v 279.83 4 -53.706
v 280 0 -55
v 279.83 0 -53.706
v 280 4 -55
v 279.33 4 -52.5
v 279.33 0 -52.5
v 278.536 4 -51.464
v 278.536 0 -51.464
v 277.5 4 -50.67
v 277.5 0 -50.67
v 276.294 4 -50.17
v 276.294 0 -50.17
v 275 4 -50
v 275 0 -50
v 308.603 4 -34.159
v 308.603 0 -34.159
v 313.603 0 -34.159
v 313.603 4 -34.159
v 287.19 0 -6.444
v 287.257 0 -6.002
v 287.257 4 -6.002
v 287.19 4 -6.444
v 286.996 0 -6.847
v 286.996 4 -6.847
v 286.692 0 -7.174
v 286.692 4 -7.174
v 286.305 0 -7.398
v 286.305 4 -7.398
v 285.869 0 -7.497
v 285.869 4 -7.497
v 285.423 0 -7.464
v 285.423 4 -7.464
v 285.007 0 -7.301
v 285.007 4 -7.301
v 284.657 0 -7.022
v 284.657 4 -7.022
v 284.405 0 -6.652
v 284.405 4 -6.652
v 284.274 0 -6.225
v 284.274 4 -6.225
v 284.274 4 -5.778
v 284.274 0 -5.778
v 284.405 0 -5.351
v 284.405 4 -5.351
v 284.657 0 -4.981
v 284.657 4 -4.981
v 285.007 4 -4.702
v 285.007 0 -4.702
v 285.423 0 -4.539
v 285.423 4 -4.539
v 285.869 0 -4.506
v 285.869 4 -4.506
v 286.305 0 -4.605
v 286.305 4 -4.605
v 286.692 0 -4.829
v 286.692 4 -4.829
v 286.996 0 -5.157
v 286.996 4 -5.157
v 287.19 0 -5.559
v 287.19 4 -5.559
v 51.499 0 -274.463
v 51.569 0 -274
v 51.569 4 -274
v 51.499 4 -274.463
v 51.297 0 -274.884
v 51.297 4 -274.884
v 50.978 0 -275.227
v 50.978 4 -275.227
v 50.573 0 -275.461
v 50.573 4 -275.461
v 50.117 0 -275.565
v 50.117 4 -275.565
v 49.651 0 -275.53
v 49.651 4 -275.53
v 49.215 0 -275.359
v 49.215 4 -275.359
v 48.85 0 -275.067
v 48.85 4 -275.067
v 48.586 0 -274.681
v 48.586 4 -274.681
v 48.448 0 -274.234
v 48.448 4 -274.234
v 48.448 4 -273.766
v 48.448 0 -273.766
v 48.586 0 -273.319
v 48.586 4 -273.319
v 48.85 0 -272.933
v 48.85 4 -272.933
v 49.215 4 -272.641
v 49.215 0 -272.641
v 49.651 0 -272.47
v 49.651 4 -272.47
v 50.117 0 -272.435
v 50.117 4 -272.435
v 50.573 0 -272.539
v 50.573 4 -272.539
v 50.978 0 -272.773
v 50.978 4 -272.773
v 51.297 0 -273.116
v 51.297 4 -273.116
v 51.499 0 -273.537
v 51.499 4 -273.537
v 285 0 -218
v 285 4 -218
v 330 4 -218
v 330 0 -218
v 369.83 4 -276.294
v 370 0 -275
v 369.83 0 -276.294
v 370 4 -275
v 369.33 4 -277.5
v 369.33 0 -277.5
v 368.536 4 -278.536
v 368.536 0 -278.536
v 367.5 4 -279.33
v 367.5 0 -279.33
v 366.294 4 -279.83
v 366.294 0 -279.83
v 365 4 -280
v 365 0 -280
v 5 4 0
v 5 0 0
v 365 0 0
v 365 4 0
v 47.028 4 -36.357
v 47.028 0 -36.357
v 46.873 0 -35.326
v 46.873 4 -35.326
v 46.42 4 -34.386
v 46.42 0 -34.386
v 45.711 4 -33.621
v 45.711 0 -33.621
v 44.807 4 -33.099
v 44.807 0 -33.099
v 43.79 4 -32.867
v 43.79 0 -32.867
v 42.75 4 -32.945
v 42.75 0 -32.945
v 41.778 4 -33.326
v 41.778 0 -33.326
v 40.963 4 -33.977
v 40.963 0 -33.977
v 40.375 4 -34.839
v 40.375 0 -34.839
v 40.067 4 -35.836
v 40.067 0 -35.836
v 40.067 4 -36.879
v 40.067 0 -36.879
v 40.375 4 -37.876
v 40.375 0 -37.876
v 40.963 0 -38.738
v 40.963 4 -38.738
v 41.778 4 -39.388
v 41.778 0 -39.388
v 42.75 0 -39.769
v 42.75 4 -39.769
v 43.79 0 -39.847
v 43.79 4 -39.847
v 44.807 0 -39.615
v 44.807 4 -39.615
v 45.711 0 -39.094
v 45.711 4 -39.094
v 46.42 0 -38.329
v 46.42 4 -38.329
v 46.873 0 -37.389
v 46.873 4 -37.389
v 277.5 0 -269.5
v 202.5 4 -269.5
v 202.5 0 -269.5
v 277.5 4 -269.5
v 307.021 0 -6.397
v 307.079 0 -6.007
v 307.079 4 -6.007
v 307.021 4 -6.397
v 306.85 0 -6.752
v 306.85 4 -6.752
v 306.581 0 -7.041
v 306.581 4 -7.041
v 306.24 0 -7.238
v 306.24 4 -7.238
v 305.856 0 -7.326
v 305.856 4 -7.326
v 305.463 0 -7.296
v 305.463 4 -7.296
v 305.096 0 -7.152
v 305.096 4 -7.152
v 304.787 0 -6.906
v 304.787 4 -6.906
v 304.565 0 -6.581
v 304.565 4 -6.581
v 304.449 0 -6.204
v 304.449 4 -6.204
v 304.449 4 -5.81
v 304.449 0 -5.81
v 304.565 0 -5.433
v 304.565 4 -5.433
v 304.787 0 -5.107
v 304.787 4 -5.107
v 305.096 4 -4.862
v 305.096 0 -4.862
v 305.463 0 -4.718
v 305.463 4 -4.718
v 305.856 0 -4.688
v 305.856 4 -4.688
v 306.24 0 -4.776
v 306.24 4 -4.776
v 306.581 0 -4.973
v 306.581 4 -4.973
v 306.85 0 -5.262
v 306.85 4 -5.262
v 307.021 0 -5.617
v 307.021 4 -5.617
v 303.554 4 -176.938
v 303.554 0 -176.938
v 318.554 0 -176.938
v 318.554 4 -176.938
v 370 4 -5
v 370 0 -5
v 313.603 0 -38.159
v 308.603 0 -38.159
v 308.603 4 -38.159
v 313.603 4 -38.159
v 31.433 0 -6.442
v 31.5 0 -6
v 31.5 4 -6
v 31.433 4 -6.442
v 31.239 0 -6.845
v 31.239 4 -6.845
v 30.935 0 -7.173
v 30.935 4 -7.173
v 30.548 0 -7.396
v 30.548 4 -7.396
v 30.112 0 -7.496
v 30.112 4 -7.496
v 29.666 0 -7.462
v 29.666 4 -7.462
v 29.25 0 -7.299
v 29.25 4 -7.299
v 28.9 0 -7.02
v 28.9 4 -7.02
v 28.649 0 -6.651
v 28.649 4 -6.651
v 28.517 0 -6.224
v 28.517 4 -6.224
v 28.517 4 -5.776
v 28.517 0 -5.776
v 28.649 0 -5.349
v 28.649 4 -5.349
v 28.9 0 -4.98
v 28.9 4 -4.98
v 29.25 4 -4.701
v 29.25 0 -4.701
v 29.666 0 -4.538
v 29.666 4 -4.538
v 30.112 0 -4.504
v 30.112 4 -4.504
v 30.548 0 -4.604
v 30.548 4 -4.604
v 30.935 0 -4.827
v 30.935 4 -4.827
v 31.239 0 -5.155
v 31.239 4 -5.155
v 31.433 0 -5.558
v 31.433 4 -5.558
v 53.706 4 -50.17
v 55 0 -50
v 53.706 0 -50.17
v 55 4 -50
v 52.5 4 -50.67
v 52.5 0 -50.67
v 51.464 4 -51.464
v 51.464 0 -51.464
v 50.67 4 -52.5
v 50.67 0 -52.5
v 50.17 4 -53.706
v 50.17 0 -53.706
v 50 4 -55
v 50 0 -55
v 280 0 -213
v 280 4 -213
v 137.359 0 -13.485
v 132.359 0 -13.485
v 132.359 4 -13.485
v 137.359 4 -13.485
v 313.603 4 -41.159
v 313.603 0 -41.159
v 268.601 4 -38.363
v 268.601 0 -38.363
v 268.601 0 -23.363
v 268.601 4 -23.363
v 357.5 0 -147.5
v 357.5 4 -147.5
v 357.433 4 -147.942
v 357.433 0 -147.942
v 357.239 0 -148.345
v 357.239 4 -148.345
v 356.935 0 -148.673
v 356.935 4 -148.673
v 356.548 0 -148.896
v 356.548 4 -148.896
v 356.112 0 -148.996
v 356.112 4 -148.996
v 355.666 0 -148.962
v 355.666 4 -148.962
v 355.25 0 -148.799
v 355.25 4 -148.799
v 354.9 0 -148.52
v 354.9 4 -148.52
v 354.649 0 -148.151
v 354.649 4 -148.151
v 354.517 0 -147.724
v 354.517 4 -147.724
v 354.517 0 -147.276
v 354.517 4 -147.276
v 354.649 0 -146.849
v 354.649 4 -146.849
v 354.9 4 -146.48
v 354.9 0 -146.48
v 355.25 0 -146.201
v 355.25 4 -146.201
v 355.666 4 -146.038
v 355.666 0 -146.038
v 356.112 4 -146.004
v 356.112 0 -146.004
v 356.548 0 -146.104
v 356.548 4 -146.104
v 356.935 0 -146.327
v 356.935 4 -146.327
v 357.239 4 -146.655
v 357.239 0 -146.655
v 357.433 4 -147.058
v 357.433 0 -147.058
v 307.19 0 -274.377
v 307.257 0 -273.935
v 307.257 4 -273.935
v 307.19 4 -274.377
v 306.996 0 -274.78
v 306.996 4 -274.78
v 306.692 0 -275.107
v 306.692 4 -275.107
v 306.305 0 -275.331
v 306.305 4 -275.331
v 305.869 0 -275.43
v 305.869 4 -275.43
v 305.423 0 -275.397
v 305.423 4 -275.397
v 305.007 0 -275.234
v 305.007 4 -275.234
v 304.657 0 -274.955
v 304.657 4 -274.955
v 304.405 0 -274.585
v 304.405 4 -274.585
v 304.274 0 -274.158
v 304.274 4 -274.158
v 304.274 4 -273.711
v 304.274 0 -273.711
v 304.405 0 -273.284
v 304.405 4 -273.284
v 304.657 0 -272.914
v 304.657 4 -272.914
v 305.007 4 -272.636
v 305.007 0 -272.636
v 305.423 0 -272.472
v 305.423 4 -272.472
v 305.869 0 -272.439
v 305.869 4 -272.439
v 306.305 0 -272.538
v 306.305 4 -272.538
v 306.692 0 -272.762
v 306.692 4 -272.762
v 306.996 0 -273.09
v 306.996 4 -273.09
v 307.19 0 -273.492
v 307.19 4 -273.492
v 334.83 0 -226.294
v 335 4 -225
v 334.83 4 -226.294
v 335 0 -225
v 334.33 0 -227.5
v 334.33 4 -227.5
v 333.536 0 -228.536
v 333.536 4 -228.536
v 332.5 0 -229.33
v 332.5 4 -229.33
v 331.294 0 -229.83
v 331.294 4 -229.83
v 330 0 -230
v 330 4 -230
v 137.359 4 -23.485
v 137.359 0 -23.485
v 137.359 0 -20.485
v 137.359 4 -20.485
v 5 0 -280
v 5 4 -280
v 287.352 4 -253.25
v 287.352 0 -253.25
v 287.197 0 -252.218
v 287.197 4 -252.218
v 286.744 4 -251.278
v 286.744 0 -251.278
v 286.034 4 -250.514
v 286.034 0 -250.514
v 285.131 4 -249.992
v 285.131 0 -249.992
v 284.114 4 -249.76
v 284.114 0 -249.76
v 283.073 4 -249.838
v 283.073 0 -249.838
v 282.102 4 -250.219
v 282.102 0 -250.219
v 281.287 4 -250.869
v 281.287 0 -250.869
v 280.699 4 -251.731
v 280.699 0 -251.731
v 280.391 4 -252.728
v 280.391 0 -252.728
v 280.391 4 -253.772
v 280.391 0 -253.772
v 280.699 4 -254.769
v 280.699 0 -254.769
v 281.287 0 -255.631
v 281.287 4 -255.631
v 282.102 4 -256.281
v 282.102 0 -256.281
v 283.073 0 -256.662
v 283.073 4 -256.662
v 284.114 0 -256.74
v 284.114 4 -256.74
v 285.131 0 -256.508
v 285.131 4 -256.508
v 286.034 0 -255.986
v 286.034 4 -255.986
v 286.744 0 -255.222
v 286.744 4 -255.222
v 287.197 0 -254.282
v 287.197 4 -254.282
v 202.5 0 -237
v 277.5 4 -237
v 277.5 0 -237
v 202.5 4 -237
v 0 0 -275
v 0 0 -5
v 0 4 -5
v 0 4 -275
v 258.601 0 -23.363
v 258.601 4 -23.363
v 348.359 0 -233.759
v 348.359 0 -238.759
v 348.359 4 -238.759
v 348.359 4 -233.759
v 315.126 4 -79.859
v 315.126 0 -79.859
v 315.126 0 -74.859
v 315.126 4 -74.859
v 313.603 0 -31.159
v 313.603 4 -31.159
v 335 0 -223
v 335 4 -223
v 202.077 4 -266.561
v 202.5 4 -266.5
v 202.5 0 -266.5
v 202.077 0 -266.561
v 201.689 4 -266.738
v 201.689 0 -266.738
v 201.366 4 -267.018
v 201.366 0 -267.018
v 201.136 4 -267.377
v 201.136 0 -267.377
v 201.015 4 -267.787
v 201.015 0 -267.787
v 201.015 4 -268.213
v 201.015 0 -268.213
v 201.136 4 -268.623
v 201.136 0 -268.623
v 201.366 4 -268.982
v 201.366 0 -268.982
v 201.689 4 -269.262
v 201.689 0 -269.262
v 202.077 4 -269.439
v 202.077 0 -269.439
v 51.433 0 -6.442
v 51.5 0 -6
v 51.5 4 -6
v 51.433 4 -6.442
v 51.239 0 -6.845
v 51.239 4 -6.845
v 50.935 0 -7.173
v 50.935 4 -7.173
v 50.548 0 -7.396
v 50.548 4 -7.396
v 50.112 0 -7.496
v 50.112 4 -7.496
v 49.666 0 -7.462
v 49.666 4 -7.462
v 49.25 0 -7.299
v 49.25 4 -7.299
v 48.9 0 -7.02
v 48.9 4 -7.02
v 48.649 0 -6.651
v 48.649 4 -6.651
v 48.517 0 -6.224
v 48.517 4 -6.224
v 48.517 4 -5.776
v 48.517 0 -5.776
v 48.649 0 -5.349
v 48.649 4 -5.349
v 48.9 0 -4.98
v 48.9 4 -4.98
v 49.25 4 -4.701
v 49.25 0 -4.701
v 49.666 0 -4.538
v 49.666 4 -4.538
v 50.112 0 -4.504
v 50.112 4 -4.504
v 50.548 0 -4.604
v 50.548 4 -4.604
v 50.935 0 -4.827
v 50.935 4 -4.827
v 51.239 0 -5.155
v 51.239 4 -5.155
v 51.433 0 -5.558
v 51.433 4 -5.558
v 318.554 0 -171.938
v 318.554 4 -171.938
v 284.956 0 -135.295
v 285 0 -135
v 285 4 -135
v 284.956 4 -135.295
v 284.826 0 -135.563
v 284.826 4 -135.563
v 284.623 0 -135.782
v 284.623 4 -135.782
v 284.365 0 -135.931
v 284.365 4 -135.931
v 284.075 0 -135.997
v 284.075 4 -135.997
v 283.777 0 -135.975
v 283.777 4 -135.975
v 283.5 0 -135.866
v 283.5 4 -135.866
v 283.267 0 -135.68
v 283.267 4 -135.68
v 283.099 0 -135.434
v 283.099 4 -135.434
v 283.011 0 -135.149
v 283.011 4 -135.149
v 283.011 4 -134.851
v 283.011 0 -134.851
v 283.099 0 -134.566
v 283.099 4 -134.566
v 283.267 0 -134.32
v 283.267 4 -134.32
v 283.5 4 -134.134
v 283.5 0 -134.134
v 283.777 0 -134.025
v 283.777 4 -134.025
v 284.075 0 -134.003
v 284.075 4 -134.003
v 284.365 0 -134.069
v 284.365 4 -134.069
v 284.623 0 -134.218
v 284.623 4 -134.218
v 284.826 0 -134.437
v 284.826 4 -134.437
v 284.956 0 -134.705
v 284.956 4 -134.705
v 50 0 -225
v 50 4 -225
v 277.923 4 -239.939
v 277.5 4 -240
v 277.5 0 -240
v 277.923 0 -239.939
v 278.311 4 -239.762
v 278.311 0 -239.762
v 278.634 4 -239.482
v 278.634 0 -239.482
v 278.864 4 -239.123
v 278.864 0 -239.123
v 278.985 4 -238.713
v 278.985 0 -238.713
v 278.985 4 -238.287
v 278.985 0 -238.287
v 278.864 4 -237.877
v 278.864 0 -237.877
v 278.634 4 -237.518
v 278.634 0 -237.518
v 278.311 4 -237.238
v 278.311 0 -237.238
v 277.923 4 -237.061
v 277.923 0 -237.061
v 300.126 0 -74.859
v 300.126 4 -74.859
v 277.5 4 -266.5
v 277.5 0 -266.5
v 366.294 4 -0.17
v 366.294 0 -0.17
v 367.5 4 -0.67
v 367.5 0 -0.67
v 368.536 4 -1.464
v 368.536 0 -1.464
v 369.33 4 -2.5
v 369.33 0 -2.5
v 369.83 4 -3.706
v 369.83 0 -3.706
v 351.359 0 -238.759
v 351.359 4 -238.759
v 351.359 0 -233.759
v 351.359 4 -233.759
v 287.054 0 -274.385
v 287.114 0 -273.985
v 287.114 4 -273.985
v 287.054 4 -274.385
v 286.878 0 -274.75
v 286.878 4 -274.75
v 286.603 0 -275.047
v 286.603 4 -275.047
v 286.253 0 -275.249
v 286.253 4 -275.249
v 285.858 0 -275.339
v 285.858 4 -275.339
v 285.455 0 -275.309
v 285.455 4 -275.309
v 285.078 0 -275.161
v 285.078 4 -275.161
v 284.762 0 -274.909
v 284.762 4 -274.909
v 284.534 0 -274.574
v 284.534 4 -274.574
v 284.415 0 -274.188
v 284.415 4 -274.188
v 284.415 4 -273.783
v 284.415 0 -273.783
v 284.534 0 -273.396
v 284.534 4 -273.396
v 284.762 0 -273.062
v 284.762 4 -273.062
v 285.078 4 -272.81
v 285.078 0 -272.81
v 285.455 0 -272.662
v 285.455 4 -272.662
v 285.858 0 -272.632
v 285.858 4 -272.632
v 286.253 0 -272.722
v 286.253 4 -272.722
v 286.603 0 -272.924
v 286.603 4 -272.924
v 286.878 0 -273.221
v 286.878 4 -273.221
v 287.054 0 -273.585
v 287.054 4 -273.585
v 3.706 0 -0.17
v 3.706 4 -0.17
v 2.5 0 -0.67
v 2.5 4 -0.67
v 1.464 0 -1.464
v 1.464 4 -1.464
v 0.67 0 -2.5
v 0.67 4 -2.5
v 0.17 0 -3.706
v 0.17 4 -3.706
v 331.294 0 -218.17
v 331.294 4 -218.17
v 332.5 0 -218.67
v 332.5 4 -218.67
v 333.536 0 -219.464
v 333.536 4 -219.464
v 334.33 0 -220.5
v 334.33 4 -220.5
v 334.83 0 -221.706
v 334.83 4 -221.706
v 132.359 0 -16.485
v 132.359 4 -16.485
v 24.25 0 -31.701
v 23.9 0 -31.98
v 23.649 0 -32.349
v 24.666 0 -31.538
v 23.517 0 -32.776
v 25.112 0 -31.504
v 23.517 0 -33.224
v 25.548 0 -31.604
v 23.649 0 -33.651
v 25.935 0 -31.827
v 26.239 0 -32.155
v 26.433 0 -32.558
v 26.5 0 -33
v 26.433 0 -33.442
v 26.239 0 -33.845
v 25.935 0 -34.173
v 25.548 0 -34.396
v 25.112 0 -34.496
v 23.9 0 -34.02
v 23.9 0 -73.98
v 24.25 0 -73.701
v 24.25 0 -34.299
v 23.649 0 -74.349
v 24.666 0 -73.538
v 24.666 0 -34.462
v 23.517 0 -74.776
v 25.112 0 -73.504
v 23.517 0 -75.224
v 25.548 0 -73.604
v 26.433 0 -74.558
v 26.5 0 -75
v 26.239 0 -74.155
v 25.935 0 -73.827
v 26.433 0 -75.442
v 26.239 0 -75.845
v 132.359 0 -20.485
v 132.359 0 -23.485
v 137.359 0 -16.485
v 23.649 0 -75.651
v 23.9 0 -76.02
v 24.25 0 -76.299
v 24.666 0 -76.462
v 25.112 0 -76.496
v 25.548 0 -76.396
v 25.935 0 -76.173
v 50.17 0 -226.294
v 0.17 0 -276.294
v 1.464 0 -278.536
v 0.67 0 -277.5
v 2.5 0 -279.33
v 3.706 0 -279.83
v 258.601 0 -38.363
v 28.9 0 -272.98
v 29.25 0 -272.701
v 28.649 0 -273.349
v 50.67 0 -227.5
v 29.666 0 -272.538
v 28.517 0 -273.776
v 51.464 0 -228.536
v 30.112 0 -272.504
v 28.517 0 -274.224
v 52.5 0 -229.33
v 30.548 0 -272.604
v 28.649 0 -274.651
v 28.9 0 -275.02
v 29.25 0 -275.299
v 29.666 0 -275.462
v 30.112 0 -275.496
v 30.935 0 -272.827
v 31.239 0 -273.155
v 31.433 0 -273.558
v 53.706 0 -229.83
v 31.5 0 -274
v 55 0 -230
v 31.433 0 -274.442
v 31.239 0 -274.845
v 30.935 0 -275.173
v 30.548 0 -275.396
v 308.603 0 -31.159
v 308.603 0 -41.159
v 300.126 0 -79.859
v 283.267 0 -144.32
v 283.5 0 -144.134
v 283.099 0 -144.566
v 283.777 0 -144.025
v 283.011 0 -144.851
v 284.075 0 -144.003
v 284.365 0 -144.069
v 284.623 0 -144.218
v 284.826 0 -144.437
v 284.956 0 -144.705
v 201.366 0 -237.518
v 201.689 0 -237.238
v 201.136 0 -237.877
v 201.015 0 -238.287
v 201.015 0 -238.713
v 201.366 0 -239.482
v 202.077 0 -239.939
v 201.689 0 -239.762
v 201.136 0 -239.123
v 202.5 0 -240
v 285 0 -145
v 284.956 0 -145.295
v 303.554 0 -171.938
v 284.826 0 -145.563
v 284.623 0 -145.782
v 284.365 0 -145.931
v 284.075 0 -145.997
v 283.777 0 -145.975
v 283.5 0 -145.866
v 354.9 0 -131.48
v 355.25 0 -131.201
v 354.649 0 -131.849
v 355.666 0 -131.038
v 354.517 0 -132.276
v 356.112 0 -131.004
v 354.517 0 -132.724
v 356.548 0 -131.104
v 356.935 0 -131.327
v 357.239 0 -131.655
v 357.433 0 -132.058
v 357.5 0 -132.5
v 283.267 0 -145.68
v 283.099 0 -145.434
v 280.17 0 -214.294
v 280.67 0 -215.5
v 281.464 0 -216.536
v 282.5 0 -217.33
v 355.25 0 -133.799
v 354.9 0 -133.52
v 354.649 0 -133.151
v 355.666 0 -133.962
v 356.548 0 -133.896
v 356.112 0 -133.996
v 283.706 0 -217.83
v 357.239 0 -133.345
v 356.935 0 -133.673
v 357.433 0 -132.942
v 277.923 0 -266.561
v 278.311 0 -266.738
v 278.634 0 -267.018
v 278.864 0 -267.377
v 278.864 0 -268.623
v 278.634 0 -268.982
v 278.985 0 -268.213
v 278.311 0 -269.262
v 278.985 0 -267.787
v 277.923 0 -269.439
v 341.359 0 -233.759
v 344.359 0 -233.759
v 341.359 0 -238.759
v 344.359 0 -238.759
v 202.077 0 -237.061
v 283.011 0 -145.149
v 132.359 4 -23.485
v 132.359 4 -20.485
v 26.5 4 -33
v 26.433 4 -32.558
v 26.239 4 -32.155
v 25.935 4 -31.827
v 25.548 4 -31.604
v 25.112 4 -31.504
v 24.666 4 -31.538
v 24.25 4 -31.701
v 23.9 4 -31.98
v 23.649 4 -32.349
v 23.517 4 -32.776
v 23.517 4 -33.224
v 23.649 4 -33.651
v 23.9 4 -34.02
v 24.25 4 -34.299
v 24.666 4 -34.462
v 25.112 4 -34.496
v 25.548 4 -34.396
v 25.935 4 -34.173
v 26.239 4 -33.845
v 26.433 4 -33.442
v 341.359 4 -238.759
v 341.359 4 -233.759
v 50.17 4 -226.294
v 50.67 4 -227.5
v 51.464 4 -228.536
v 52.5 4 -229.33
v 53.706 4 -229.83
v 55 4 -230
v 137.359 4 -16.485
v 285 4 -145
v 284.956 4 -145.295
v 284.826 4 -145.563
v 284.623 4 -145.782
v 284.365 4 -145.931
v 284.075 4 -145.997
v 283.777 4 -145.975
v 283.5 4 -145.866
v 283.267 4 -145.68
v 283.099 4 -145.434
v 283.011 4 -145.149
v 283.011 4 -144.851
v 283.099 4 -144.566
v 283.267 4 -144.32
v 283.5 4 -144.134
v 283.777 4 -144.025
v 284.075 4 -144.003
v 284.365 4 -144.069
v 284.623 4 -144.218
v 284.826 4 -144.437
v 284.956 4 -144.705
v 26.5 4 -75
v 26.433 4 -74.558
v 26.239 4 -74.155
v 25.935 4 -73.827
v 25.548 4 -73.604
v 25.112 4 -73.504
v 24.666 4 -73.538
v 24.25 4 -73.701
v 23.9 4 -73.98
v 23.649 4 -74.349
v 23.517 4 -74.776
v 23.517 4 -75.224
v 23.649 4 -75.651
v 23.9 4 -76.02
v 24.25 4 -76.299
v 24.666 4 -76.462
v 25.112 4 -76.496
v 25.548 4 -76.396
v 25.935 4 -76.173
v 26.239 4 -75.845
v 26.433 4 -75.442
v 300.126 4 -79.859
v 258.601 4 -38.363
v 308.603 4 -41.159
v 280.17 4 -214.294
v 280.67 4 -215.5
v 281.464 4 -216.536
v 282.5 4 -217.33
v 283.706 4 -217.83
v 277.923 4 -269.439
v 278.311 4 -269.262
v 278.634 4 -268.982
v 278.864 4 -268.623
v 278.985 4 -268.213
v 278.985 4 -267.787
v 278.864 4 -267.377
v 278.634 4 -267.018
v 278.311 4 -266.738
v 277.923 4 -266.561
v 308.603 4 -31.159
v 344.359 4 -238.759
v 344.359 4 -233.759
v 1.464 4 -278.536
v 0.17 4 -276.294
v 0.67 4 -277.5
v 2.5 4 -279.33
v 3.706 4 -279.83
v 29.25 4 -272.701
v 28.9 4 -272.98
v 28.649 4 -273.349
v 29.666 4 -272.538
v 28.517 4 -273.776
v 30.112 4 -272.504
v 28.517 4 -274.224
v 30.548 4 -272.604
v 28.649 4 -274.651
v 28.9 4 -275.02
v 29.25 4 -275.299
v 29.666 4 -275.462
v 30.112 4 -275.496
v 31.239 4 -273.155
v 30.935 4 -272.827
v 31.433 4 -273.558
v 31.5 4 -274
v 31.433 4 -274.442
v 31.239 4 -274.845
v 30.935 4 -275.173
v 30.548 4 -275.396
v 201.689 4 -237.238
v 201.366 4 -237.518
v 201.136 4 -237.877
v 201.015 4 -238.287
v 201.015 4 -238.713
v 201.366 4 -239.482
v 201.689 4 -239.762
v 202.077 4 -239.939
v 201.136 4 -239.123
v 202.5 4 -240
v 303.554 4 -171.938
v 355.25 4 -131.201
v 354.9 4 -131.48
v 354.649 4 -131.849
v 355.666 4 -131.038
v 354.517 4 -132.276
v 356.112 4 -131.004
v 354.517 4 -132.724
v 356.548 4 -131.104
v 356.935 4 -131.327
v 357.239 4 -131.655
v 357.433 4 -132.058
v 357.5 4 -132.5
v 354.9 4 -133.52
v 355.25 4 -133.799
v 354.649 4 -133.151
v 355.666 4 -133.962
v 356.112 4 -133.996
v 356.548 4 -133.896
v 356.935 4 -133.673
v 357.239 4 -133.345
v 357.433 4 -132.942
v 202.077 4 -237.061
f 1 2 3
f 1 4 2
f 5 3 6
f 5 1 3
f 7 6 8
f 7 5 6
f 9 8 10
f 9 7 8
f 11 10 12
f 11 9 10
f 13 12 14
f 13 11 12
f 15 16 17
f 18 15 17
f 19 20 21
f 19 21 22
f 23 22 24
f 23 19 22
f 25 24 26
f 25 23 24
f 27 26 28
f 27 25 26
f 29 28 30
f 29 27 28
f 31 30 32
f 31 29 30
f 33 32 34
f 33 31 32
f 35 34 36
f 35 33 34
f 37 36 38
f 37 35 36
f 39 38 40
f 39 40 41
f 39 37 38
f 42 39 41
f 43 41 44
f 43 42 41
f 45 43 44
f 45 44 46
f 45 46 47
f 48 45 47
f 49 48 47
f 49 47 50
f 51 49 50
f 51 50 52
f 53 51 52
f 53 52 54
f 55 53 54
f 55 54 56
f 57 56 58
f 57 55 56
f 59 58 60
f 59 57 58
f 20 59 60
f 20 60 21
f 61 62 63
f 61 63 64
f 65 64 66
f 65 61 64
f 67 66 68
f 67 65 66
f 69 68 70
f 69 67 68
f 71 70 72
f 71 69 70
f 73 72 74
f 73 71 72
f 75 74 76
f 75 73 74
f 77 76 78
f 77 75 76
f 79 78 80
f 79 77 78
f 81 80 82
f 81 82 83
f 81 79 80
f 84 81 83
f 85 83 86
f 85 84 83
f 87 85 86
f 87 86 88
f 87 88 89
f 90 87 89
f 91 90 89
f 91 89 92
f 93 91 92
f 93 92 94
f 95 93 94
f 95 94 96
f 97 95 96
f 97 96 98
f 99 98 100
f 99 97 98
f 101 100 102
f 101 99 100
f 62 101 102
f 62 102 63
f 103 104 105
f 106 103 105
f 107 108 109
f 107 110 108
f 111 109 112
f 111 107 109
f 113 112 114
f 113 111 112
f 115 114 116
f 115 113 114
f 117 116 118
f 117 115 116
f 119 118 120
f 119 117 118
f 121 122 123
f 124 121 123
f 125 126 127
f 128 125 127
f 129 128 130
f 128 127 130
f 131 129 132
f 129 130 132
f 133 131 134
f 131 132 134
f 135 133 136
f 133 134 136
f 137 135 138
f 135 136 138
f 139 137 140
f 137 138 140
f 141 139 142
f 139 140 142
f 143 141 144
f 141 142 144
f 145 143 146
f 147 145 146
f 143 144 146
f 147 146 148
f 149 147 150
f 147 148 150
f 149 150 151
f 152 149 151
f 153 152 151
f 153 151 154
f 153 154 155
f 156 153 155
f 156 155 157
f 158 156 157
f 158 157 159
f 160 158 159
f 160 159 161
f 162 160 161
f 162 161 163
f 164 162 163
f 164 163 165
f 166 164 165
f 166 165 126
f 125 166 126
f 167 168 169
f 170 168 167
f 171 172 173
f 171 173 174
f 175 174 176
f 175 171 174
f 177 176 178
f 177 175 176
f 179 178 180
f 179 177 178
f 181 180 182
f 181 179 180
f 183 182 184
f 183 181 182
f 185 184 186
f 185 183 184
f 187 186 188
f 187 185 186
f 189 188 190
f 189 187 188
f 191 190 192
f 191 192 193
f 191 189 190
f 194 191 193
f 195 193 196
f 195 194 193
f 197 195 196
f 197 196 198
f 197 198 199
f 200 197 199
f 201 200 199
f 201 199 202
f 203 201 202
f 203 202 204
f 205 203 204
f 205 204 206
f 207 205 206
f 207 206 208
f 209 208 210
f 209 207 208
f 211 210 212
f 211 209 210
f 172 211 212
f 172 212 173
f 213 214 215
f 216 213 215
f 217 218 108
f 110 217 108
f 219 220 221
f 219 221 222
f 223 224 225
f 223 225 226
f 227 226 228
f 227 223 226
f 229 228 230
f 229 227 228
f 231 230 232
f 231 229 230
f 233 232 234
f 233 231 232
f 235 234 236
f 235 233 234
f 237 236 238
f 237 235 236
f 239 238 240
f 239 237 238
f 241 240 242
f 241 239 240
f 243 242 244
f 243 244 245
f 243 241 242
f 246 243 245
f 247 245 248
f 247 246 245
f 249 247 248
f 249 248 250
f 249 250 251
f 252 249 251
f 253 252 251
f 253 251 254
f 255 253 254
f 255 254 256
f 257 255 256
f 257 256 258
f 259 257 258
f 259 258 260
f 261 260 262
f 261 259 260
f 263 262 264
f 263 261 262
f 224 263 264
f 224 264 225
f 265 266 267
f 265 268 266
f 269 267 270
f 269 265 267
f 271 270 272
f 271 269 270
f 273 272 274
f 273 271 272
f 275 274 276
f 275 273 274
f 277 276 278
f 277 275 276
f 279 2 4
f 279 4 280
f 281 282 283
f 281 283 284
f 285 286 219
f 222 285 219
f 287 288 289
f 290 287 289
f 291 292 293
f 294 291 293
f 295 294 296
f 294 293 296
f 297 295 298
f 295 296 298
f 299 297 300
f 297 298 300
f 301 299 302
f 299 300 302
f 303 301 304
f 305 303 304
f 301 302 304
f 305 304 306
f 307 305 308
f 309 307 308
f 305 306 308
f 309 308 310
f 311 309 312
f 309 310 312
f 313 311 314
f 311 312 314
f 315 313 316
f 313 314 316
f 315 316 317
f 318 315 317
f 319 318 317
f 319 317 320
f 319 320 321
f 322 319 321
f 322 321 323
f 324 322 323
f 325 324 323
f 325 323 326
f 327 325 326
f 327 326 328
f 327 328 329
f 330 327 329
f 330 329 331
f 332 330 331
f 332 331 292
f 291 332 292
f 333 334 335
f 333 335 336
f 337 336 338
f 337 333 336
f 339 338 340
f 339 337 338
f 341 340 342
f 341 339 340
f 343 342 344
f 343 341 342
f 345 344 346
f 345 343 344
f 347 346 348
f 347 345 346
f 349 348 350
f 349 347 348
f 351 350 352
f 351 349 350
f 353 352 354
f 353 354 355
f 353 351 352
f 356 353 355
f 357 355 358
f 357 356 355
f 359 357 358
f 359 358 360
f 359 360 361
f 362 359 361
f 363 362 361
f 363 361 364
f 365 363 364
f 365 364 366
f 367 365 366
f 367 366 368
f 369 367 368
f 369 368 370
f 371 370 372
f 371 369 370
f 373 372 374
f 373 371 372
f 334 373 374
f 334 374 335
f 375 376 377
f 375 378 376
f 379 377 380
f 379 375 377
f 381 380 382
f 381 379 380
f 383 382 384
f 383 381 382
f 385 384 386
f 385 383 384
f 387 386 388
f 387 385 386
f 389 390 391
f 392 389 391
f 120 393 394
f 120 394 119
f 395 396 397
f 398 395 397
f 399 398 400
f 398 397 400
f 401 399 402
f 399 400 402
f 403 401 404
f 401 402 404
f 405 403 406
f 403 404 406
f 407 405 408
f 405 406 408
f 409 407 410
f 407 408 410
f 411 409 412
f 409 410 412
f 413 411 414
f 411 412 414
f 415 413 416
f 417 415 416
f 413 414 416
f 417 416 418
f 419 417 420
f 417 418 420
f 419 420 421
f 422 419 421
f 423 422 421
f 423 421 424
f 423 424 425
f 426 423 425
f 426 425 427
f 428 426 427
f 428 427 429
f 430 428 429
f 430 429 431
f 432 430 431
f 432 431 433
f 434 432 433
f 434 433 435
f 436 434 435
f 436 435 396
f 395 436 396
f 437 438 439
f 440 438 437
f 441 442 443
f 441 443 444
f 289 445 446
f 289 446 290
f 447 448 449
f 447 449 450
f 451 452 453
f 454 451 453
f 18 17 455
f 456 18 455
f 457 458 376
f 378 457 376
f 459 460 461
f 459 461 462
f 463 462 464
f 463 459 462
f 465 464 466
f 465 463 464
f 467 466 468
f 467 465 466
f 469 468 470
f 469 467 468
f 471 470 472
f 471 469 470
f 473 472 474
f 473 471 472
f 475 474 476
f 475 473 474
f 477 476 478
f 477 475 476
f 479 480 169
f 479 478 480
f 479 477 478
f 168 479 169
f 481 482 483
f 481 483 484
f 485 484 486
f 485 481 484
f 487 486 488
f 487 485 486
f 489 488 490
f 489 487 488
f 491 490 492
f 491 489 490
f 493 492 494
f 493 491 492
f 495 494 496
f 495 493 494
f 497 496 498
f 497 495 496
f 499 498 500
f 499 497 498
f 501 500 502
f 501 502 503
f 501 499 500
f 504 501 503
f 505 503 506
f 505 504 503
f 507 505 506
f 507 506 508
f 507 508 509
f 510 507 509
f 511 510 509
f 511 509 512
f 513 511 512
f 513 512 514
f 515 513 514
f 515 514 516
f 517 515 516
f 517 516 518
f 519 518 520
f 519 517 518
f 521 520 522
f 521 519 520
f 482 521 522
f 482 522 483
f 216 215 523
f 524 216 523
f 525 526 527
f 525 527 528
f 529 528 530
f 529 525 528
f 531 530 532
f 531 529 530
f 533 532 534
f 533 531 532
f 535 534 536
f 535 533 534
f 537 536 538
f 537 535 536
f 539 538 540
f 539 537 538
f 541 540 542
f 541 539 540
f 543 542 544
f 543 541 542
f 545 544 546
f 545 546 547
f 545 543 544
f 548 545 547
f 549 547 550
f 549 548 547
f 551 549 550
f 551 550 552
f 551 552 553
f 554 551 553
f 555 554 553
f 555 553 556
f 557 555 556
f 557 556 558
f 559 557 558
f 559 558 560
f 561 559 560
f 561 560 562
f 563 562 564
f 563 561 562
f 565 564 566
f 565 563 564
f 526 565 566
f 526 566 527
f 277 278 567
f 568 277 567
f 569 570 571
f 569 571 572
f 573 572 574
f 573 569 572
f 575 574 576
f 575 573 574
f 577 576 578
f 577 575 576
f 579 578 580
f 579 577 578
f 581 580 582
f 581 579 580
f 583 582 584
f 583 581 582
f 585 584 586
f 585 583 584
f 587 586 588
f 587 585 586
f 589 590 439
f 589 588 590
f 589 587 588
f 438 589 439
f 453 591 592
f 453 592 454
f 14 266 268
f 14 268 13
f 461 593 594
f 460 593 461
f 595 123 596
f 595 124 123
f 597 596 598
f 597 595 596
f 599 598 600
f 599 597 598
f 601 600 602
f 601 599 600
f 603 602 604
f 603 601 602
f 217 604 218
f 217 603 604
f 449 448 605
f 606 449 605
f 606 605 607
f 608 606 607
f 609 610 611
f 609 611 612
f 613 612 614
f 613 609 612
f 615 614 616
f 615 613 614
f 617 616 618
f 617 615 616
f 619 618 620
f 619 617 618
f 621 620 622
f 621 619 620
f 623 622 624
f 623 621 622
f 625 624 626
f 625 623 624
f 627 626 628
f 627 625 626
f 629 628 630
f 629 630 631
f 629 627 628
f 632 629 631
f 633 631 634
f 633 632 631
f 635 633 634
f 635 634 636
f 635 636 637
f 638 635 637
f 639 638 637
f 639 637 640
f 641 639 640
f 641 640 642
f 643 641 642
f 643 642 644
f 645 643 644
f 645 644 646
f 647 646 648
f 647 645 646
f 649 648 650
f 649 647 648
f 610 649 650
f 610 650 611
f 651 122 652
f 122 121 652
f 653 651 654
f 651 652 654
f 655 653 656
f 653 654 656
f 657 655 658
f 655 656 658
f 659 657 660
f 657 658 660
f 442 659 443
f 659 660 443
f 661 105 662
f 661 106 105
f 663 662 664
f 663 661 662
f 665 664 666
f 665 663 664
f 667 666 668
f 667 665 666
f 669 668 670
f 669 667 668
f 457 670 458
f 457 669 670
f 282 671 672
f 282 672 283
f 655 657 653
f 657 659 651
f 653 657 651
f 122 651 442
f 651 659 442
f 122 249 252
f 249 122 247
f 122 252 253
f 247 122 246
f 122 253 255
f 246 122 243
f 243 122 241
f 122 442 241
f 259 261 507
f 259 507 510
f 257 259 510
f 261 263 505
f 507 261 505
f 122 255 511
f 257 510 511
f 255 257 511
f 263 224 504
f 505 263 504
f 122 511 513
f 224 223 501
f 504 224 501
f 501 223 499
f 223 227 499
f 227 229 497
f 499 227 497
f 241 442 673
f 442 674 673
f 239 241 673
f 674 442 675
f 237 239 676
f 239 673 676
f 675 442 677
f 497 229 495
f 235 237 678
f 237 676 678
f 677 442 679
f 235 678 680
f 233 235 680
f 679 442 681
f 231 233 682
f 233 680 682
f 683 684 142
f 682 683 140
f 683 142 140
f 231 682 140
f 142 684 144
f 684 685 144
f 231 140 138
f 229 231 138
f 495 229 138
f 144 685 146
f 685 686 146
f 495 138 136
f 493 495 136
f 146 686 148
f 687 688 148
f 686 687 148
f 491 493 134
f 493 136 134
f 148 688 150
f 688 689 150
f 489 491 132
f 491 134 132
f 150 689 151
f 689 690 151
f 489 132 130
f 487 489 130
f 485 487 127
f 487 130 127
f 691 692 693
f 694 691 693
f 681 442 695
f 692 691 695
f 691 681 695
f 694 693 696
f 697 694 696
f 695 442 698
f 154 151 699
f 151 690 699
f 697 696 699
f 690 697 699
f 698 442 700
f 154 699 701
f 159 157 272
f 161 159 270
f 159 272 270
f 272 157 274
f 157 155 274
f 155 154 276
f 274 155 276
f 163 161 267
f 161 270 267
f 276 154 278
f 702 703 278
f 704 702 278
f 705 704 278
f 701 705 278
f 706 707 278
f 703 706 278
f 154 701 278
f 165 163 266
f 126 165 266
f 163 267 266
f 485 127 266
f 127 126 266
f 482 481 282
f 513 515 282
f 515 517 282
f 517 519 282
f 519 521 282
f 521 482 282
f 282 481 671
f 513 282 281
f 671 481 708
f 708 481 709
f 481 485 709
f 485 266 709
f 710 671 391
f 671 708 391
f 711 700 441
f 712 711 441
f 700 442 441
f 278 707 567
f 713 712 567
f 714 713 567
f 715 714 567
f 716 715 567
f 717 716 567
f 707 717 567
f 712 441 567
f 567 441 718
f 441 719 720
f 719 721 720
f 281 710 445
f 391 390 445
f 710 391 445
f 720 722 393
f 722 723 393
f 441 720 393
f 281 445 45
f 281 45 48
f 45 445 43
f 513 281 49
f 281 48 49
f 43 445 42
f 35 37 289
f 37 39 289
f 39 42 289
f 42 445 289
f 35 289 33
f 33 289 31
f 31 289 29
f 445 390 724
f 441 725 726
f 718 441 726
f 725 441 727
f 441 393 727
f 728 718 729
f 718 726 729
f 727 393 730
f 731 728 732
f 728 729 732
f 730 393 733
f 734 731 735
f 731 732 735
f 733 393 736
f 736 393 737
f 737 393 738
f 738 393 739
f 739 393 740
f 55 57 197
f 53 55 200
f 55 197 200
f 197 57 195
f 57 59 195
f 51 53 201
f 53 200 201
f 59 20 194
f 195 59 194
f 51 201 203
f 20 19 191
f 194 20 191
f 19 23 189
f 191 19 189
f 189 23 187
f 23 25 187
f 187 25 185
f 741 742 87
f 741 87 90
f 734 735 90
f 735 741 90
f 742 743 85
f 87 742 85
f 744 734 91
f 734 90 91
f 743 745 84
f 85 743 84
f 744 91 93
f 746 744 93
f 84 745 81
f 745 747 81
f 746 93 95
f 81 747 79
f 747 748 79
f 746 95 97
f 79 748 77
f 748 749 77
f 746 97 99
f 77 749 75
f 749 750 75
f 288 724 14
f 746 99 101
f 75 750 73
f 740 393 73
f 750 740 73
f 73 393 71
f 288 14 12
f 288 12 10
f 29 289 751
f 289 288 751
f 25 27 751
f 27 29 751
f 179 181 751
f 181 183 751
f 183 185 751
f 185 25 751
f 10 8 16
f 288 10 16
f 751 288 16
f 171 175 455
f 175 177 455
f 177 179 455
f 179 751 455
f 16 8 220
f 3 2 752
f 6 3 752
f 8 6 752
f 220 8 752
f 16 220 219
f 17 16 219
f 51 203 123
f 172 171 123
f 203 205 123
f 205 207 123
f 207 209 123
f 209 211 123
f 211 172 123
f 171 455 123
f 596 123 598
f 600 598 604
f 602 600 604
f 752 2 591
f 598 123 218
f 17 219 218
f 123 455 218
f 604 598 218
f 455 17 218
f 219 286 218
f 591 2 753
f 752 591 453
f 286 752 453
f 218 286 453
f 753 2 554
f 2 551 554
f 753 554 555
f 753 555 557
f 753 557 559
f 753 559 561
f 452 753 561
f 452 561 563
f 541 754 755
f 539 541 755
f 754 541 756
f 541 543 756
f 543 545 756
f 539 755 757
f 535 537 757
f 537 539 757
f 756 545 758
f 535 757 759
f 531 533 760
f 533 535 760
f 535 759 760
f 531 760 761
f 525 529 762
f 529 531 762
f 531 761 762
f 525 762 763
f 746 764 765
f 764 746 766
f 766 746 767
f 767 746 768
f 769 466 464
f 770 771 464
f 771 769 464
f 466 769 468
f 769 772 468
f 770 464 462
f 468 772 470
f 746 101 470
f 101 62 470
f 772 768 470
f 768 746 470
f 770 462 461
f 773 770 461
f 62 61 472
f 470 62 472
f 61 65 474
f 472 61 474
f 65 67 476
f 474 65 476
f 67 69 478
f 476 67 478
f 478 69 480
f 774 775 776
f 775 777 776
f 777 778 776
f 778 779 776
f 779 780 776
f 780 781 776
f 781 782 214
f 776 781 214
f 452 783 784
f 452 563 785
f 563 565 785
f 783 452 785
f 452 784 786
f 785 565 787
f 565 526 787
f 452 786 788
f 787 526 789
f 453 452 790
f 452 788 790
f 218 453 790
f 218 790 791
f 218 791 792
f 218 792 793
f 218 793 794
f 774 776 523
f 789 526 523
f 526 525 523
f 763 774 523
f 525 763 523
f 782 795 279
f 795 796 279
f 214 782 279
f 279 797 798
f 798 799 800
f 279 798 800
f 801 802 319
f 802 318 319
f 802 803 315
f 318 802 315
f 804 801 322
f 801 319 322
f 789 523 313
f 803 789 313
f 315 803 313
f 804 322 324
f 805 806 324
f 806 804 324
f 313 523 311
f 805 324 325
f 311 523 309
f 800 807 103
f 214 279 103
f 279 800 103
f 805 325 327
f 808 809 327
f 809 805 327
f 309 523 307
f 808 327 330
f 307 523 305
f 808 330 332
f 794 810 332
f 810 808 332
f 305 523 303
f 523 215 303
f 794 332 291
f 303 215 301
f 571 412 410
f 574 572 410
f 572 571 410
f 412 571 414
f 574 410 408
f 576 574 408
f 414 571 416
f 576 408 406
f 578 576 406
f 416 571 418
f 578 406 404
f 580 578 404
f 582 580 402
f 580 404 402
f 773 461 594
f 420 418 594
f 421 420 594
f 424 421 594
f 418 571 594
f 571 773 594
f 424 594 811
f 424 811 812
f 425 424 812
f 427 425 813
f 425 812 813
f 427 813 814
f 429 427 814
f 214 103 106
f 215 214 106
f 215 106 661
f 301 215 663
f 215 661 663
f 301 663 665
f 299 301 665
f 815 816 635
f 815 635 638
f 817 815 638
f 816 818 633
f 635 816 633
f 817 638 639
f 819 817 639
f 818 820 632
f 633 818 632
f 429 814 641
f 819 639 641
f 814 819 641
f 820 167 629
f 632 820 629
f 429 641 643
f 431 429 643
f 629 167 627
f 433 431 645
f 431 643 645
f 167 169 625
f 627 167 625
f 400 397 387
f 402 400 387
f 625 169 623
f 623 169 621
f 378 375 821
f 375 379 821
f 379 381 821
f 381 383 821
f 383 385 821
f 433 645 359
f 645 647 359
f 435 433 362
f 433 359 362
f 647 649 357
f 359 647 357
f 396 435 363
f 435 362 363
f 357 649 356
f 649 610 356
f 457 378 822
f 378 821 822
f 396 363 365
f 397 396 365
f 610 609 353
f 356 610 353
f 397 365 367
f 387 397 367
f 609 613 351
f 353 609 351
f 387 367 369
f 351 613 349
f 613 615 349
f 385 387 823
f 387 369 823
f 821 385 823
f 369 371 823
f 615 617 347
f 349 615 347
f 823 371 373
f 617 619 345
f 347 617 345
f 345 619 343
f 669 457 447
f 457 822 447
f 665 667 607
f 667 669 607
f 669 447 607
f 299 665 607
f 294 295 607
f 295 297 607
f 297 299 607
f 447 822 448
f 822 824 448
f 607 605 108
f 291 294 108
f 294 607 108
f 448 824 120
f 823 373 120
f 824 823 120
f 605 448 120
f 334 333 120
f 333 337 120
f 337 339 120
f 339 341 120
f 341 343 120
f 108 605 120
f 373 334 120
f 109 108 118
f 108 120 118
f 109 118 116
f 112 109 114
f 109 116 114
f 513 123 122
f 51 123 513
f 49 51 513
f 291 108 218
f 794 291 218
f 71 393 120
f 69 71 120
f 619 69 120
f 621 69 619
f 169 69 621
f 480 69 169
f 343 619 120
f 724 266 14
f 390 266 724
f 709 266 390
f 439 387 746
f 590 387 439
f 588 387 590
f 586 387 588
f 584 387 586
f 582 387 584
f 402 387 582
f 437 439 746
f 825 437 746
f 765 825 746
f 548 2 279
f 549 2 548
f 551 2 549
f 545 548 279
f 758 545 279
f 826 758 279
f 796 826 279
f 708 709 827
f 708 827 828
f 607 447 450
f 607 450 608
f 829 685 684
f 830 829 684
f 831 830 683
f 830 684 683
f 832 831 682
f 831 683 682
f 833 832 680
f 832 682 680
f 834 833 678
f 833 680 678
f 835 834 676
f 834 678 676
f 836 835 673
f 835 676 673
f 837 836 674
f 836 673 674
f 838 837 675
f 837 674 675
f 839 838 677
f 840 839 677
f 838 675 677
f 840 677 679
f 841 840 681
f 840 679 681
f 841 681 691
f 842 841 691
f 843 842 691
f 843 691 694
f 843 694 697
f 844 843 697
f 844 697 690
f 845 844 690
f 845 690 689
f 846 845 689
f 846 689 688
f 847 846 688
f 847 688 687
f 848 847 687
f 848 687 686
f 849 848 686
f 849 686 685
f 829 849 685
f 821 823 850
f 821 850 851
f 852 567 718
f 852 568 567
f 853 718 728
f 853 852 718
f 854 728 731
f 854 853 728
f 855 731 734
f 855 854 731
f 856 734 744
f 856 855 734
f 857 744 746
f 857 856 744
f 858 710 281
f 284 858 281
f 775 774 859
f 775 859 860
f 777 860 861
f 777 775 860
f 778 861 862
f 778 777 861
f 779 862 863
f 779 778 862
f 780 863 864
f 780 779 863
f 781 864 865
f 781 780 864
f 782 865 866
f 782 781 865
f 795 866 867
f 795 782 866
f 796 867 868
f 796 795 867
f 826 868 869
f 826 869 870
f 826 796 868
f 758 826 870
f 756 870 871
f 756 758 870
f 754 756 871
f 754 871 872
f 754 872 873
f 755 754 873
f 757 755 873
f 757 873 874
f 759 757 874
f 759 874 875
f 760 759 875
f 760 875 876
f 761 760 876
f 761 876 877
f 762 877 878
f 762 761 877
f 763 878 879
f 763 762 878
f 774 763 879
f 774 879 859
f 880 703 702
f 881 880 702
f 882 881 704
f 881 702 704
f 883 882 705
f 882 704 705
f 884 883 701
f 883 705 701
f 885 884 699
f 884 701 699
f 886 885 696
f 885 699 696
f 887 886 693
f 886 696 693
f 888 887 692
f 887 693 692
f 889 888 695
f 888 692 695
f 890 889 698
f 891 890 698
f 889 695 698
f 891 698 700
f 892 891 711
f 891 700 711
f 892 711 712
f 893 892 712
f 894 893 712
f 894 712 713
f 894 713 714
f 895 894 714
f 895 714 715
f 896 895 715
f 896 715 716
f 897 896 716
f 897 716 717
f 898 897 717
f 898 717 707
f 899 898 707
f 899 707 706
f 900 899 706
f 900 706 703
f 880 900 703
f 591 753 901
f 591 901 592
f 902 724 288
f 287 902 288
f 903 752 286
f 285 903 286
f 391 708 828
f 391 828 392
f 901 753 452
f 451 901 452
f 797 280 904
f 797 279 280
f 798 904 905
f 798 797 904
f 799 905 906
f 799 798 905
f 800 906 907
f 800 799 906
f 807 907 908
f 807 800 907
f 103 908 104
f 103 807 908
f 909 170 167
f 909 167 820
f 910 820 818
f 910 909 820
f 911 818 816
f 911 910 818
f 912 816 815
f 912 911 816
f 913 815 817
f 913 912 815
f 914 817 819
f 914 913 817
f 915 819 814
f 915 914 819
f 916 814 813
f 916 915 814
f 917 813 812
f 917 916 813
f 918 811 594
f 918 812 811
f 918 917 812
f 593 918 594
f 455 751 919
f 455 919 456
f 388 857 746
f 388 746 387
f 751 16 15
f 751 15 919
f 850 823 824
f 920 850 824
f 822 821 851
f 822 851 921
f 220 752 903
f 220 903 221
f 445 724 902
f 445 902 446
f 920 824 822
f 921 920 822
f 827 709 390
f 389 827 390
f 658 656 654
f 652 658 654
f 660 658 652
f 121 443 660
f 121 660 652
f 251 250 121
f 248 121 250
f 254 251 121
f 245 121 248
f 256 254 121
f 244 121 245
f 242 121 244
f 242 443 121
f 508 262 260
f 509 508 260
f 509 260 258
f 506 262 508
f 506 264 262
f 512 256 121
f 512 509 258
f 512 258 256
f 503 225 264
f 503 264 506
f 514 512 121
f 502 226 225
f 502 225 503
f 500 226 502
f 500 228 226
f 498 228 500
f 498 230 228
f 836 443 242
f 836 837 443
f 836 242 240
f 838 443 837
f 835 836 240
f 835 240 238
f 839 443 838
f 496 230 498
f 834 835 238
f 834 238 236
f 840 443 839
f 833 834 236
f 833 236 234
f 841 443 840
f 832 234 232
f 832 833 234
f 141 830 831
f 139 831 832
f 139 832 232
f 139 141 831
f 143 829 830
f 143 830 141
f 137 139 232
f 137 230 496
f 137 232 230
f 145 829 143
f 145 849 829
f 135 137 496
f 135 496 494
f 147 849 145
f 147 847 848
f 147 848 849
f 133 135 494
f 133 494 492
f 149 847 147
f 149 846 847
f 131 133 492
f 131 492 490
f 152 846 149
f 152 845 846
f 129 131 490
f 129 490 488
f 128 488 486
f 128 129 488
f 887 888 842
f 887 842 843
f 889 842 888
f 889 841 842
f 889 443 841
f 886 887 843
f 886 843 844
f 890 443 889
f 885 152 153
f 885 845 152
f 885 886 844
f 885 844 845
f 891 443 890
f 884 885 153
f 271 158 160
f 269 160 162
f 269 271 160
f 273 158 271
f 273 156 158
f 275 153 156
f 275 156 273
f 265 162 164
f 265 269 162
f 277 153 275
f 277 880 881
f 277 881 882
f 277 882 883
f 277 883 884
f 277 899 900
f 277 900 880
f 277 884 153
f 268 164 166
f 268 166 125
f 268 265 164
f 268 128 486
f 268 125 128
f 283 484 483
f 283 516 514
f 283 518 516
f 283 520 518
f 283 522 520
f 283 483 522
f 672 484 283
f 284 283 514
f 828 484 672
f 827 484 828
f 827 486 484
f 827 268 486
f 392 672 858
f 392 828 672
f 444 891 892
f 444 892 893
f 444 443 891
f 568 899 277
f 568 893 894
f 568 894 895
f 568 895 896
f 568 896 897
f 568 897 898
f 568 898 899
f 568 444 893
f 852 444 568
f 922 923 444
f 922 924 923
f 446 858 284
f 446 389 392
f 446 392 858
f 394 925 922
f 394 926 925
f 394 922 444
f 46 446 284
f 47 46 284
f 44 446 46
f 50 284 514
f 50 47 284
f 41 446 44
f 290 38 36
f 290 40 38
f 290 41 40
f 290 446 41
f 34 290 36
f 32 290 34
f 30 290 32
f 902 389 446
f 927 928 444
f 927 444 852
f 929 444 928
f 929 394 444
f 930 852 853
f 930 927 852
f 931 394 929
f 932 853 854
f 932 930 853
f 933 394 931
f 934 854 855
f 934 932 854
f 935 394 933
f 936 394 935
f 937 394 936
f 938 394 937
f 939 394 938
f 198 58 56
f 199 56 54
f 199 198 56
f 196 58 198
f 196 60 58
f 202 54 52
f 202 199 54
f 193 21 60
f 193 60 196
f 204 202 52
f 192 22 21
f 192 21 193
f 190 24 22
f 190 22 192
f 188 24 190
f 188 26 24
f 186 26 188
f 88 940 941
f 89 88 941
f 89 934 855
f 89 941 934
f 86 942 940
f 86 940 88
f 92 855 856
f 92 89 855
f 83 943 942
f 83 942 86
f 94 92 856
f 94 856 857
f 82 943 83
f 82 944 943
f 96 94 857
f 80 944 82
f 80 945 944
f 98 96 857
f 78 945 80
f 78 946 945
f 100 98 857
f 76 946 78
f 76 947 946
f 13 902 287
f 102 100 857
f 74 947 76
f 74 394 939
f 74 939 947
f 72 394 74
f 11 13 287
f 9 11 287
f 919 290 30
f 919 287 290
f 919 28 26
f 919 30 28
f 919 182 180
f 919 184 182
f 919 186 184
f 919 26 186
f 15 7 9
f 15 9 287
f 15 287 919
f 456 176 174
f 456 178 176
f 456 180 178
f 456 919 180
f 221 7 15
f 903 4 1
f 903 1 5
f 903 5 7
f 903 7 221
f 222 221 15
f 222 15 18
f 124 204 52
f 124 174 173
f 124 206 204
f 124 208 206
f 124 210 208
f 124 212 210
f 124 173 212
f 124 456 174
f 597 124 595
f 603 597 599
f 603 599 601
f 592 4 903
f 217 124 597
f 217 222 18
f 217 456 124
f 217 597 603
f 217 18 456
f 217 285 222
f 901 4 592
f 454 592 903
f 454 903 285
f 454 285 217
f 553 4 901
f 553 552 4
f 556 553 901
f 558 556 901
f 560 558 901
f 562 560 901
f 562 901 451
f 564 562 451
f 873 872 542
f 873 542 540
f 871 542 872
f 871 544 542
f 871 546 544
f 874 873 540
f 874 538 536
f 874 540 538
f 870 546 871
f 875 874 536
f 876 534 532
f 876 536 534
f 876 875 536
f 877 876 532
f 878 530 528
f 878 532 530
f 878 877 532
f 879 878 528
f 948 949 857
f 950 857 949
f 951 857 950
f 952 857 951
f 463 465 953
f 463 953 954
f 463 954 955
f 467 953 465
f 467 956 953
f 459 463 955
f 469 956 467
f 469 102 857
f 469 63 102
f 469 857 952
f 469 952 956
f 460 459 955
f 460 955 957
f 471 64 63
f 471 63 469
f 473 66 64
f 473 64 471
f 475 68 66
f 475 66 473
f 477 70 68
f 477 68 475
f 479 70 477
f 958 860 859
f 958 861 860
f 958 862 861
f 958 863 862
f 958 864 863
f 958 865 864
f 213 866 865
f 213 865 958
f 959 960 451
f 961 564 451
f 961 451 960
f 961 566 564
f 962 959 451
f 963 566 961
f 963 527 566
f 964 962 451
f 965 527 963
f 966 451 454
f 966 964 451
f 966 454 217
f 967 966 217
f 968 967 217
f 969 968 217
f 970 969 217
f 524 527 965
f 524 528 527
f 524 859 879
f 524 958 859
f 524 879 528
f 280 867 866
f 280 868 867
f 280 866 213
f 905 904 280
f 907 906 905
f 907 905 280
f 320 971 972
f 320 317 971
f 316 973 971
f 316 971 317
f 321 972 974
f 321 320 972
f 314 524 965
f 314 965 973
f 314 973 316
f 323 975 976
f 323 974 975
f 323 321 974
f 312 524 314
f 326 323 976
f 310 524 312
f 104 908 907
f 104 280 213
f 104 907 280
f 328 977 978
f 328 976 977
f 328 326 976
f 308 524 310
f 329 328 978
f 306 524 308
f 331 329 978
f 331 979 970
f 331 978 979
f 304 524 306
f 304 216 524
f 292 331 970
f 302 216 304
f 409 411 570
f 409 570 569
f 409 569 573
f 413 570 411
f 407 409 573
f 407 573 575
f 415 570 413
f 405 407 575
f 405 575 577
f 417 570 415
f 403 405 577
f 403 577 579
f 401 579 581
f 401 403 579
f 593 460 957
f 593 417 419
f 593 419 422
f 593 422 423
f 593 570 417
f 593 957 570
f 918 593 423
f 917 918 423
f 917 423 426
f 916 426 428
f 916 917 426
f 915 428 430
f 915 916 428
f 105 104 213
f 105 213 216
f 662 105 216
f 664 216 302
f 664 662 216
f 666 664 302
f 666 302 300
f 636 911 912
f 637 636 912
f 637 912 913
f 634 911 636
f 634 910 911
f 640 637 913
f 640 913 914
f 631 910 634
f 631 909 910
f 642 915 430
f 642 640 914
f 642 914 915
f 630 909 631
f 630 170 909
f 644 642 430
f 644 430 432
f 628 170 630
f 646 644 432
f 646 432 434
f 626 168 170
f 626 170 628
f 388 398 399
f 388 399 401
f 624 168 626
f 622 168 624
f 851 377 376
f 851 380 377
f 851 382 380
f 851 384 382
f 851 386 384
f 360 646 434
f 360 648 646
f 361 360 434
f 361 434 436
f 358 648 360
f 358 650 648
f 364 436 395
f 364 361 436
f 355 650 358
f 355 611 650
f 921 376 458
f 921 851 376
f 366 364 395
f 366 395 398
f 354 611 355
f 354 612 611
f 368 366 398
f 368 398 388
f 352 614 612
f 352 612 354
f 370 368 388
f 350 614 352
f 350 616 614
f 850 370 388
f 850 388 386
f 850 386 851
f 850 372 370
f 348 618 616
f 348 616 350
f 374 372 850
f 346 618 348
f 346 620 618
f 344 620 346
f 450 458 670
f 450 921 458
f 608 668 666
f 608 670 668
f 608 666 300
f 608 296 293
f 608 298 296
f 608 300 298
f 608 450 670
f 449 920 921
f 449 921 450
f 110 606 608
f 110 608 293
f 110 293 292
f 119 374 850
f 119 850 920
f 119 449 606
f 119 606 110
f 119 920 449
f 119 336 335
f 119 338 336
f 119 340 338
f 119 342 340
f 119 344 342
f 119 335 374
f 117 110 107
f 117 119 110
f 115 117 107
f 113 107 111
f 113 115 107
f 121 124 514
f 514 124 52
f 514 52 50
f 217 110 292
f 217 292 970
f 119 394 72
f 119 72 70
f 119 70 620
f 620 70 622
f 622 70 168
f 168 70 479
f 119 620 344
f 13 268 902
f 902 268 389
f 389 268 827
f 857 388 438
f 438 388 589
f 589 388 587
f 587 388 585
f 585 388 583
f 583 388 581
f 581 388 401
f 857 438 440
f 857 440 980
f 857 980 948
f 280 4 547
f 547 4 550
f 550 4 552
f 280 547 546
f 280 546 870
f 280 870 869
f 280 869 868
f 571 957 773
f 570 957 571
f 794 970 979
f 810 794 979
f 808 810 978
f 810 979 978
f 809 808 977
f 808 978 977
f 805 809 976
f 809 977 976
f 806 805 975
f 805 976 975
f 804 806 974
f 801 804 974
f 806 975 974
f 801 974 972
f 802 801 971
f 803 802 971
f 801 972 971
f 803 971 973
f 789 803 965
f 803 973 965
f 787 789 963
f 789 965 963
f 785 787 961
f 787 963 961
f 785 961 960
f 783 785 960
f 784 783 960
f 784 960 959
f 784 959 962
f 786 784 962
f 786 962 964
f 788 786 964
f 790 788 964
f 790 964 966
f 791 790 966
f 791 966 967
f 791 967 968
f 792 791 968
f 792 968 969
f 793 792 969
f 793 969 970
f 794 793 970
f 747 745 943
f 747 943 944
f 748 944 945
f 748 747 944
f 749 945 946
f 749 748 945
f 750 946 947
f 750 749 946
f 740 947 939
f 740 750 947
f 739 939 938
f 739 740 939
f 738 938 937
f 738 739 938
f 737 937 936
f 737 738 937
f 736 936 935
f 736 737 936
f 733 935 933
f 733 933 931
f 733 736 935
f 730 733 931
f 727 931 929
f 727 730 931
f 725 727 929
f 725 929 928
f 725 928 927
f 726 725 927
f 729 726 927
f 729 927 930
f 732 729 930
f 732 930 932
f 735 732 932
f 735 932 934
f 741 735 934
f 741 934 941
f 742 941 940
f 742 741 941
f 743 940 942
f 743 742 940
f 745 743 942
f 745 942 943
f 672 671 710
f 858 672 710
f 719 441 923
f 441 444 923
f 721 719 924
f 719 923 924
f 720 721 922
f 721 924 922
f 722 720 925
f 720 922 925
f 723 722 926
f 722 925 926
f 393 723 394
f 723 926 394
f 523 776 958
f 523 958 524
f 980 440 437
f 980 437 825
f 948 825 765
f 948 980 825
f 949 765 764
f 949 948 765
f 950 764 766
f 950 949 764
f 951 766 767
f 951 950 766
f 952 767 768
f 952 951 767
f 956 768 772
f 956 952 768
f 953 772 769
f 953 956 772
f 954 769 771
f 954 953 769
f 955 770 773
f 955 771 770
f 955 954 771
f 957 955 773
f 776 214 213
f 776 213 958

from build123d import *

# Parameters (mm, degrees)
SKETCH1_W           = 370
SKETCH1_H           = 280
SKETCH1_R           = 1.5
SKETCH1_R_2         = 1.569181713
SKETCH1_R_3         = 1.357318829
SKETCH1_R_4         = 1.322467774
SKETCH1_R_5         = 1
SKETCH1_W_2         = 230
SKETCH1_H_2         = 180
BOSS_EXTRUDE1_DEPTH = 4
SKETCH2_W           = 55
SKETCH2_H           = 12
CUT_EXTRUDE1_DEPTH  = 10
SKETCH3_R           = 1.5
CUT_EXTRUDE2_DEPTH  = 10
CUT_EXTRUDE3_DEPTH  = 10
FILLET3_R           = 5
FILLET4_R           = 5
FILLET5_R           = 5
FILLET6_R           = 5
FILLET7_R           = 5
FILLET8_R           = 5
FILLET9_R           = 5
SKETCH6_R           = 3.5
CUT_EXTRUDE4_DEPTH  = 10
SKETCH7_R           = 3.5
CUT_EXTRUDE5_DEPTH  = 10
SKETCH8_W           = 5
SKETCH8_H           = 3
SKETCH8_W_2         = 10
SKETCH8_H_2         = 15
SKETCH8_W_3         = 15
SKETCH8_H_3         = 5
SKETCH8_W_4         = 3
CUT_EXTRUDE6_DEPTH  = 10
SKETCH9_R           = 1.5
CUT_EXTRUDE7_DEPTH  = 10


with BuildPart() as part:
    # Sketch1 → Boss-Extrude1 (new body)
    with BuildSketch(Plane(origin=(0, 0, 0), x_dir=(1, 0, 0), z_dir=(0, 1, 0))):
        with Locations((185, 140)):
            Rectangle(SKETCH1_W, SKETCH1_H)
        with Locations((30, 274)):
            Circle(SKETCH1_R, mode=Mode.SUBTRACT)
        with Locations((50, 274)):
            Circle(SKETCH1_R_2, mode=Mode.SUBTRACT)
        with Locations((30, 6)):
            Circle(SKETCH1_R, mode=Mode.SUBTRACT)
        with Locations((50, 6)):
            Circle(SKETCH1_R, mode=Mode.SUBTRACT)
        with Locations((285.756924446, 273.985388104)):
            Circle(SKETCH1_R_3, mode=Mode.SUBTRACT)
        with Locations((305.756860025, 273.934625414)):
            Circle(SKETCH1_R, mode=Mode.SUBTRACT)
        with Locations((285.756860726, 6.001523901)):
            Circle(SKETCH1_R, mode=Mode.SUBTRACT)
        with Locations((305.756860025, 6.006818111)):
            Circle(SKETCH1_R_4, mode=Mode.SUBTRACT)
        with Locations((284, 145)):
            Circle(SKETCH1_R_5, mode=Mode.SUBTRACT)
        with Locations((284, 135)):
            Circle(SKETCH1_R_5, mode=Mode.SUBTRACT)
        with Locations((165, 140)):
            Rectangle(SKETCH1_W_2, SKETCH1_H_2, mode=Mode.SUBTRACT)
    extrude(amount=BOSS_EXTRUDE1_DEPTH)

    # Sketch2 → Cut-Extrude1 (cut)
    with BuildSketch(Plane(origin=(0, 4, 0), x_dir=(1, 0, 0), z_dir=(0, 1, 0))):
        with Locations((307.5, 224)):
            Rectangle(SKETCH2_W, SKETCH2_H)
    extrude(amount=-CUT_EXTRUDE1_DEPTH, mode=Mode.SUBTRACT)

    # Sketch3 → Cut-Extrude2 (cut)
    with BuildSketch(Plane(origin=(0, 4, 0), x_dir=(1, 0, 0), z_dir=(0, 1, 0))):
        with Locations((356, 147.5)):
            Circle(SKETCH3_R)
        with Locations((356, 132.5)):
            Circle(SKETCH3_R)
    extrude(amount=-CUT_EXTRUDE2_DEPTH, mode=Mode.SUBTRACT)

    # Sketch4 → Cut-Extrude3 (cut)
    with BuildSketch(Plane(origin=(0, 4, 0), x_dir=(1, 0, 0), z_dir=(0, 1, 0))):
        with BuildLine():
            Line((277.5, 266.5), (202.5, 266.5))
            ThreePointArc((202.5, 266.5), (201, 268), (202.5, 269.5))
            Line((202.5, 269.5), (277.5, 269.5))
            ThreePointArc((277.5, 269.5), (279, 268), (277.5, 266.5))
        make_face()
        with BuildLine():
            Line((277.5, 237), (202.5, 237))
            ThreePointArc((202.5, 237), (201, 238.5), (202.5, 240))
            Line((202.5, 240), (277.5, 240))
            ThreePointArc((277.5, 240), (279, 238.5), (277.5, 237))
        make_face()
    extrude(amount=-CUT_EXTRUDE3_DEPTH, mode=Mode.SUBTRACT)

    # Fillet3
    fillet3_edges = [part.edges().sort_by_distance(p)[0] for p in [
        (370, 2, 0),
    ]]
    fillet(fillet3_edges, radius=FILLET3_R)

    # Fillet4
    fillet4_edges = [part.edges().sort_by_distance(p)[0] for p in [
        (370, 2, -280),
    ]]
    fillet(fillet4_edges, radius=FILLET4_R)

    # Fillet5
    fillet5_edges = [part.edges().sort_by_distance(p)[0] for p in [
        (0, 2, 0),
    ]]
    fillet(fillet5_edges, radius=FILLET5_R)

    # Fillet6
    fillet6_edges = [part.edges().sort_by_distance(p)[0] for p in [
        (0, 2, -280),
    ]]
    fillet(fillet6_edges, radius=FILLET6_R)

    # Fillet7
    fillet7_edges = [part.edges().sort_by_distance(p)[0] for p in [
        (280, 2, -218),
    ]]
    fillet(fillet7_edges, radius=FILLET7_R)

    # Fillet8
    fillet8_edges = [part.edges().sort_by_distance(p)[0] for p in [
        (280, 2, -50),
    ]]
    fillet(fillet8_edges, radius=FILLET8_R)

    # Fillet9
    fillet9_edges = [part.edges().sort_by_distance(p)[0] for p in [
        (50, 2, -230),
        (50, 2, -50),
        (335, 2, -230),
        (335, 2, -218),
    ]]
    fillet(fillet9_edges, radius=FILLET9_R)

    # Sketch6 → Cut-Extrude4 (cut)
    with BuildSketch(Plane.XZ):
        with Locations((283.852252581, -253.25)):
            Circle(SKETCH6_R)
    extrude(amount=-CUT_EXTRUDE4_DEPTH, mode=Mode.SUBTRACT)

    # Sketch7 → Cut-Extrude5 (cut)
    with BuildSketch(Plane.XZ):
        with Locations((43.528330195, -36.357190156)):
            Circle(SKETCH7_R)
    extrude(amount=-CUT_EXTRUDE5_DEPTH, mode=Mode.SUBTRACT)

    # Sketch8 → Cut-Extrude6 (cut)
    with BuildSketch(Plane.XZ):
        with Locations((134.85877855, -14.984967273)):
            Rectangle(SKETCH8_W, SKETCH8_H)
        with Locations((134.85877855, -21.984967273)):
            Rectangle(SKETCH8_W, SKETCH8_H)
        with Locations((263.601107072, -30.863134191)):
            Rectangle(SKETCH8_W_2, SKETCH8_H_2)
        with Locations((311.102535039, -32.659137944)):
            Rectangle(SKETCH8_W, SKETCH8_H)
        with Locations((311.102535039, -39.659137944)):
            Rectangle(SKETCH8_W, SKETCH8_H)
        with Locations((307.626119627, -77.359497152)):
            Rectangle(SKETCH8_W_3, SKETCH8_H_3)
        with Locations((342.859262651, -236.259221691)):
            Rectangle(SKETCH8_W_4, SKETCH8_H_3)
        with Locations((349.859262651, -236.259221691)):
            Rectangle(SKETCH8_W_4, SKETCH8_H_3)
        with Locations((311.053880499, -174.438404524)):
            Rectangle(SKETCH8_W_3, SKETCH8_H_3)
    extrude(amount=-CUT_EXTRUDE6_DEPTH, mode=Mode.SUBTRACT)

    # Sketch9 → Cut-Extrude7 (cut)
    with BuildSketch(Plane.XZ):
        with Locations((25, -33)):
            Circle(SKETCH9_R)
        with Locations((25, -75)):
            Circle(SKETCH9_R)
    extrude(amount=-CUT_EXTRUDE7_DEPTH, mode=Mode.SUBTRACT)


solid = part.part
